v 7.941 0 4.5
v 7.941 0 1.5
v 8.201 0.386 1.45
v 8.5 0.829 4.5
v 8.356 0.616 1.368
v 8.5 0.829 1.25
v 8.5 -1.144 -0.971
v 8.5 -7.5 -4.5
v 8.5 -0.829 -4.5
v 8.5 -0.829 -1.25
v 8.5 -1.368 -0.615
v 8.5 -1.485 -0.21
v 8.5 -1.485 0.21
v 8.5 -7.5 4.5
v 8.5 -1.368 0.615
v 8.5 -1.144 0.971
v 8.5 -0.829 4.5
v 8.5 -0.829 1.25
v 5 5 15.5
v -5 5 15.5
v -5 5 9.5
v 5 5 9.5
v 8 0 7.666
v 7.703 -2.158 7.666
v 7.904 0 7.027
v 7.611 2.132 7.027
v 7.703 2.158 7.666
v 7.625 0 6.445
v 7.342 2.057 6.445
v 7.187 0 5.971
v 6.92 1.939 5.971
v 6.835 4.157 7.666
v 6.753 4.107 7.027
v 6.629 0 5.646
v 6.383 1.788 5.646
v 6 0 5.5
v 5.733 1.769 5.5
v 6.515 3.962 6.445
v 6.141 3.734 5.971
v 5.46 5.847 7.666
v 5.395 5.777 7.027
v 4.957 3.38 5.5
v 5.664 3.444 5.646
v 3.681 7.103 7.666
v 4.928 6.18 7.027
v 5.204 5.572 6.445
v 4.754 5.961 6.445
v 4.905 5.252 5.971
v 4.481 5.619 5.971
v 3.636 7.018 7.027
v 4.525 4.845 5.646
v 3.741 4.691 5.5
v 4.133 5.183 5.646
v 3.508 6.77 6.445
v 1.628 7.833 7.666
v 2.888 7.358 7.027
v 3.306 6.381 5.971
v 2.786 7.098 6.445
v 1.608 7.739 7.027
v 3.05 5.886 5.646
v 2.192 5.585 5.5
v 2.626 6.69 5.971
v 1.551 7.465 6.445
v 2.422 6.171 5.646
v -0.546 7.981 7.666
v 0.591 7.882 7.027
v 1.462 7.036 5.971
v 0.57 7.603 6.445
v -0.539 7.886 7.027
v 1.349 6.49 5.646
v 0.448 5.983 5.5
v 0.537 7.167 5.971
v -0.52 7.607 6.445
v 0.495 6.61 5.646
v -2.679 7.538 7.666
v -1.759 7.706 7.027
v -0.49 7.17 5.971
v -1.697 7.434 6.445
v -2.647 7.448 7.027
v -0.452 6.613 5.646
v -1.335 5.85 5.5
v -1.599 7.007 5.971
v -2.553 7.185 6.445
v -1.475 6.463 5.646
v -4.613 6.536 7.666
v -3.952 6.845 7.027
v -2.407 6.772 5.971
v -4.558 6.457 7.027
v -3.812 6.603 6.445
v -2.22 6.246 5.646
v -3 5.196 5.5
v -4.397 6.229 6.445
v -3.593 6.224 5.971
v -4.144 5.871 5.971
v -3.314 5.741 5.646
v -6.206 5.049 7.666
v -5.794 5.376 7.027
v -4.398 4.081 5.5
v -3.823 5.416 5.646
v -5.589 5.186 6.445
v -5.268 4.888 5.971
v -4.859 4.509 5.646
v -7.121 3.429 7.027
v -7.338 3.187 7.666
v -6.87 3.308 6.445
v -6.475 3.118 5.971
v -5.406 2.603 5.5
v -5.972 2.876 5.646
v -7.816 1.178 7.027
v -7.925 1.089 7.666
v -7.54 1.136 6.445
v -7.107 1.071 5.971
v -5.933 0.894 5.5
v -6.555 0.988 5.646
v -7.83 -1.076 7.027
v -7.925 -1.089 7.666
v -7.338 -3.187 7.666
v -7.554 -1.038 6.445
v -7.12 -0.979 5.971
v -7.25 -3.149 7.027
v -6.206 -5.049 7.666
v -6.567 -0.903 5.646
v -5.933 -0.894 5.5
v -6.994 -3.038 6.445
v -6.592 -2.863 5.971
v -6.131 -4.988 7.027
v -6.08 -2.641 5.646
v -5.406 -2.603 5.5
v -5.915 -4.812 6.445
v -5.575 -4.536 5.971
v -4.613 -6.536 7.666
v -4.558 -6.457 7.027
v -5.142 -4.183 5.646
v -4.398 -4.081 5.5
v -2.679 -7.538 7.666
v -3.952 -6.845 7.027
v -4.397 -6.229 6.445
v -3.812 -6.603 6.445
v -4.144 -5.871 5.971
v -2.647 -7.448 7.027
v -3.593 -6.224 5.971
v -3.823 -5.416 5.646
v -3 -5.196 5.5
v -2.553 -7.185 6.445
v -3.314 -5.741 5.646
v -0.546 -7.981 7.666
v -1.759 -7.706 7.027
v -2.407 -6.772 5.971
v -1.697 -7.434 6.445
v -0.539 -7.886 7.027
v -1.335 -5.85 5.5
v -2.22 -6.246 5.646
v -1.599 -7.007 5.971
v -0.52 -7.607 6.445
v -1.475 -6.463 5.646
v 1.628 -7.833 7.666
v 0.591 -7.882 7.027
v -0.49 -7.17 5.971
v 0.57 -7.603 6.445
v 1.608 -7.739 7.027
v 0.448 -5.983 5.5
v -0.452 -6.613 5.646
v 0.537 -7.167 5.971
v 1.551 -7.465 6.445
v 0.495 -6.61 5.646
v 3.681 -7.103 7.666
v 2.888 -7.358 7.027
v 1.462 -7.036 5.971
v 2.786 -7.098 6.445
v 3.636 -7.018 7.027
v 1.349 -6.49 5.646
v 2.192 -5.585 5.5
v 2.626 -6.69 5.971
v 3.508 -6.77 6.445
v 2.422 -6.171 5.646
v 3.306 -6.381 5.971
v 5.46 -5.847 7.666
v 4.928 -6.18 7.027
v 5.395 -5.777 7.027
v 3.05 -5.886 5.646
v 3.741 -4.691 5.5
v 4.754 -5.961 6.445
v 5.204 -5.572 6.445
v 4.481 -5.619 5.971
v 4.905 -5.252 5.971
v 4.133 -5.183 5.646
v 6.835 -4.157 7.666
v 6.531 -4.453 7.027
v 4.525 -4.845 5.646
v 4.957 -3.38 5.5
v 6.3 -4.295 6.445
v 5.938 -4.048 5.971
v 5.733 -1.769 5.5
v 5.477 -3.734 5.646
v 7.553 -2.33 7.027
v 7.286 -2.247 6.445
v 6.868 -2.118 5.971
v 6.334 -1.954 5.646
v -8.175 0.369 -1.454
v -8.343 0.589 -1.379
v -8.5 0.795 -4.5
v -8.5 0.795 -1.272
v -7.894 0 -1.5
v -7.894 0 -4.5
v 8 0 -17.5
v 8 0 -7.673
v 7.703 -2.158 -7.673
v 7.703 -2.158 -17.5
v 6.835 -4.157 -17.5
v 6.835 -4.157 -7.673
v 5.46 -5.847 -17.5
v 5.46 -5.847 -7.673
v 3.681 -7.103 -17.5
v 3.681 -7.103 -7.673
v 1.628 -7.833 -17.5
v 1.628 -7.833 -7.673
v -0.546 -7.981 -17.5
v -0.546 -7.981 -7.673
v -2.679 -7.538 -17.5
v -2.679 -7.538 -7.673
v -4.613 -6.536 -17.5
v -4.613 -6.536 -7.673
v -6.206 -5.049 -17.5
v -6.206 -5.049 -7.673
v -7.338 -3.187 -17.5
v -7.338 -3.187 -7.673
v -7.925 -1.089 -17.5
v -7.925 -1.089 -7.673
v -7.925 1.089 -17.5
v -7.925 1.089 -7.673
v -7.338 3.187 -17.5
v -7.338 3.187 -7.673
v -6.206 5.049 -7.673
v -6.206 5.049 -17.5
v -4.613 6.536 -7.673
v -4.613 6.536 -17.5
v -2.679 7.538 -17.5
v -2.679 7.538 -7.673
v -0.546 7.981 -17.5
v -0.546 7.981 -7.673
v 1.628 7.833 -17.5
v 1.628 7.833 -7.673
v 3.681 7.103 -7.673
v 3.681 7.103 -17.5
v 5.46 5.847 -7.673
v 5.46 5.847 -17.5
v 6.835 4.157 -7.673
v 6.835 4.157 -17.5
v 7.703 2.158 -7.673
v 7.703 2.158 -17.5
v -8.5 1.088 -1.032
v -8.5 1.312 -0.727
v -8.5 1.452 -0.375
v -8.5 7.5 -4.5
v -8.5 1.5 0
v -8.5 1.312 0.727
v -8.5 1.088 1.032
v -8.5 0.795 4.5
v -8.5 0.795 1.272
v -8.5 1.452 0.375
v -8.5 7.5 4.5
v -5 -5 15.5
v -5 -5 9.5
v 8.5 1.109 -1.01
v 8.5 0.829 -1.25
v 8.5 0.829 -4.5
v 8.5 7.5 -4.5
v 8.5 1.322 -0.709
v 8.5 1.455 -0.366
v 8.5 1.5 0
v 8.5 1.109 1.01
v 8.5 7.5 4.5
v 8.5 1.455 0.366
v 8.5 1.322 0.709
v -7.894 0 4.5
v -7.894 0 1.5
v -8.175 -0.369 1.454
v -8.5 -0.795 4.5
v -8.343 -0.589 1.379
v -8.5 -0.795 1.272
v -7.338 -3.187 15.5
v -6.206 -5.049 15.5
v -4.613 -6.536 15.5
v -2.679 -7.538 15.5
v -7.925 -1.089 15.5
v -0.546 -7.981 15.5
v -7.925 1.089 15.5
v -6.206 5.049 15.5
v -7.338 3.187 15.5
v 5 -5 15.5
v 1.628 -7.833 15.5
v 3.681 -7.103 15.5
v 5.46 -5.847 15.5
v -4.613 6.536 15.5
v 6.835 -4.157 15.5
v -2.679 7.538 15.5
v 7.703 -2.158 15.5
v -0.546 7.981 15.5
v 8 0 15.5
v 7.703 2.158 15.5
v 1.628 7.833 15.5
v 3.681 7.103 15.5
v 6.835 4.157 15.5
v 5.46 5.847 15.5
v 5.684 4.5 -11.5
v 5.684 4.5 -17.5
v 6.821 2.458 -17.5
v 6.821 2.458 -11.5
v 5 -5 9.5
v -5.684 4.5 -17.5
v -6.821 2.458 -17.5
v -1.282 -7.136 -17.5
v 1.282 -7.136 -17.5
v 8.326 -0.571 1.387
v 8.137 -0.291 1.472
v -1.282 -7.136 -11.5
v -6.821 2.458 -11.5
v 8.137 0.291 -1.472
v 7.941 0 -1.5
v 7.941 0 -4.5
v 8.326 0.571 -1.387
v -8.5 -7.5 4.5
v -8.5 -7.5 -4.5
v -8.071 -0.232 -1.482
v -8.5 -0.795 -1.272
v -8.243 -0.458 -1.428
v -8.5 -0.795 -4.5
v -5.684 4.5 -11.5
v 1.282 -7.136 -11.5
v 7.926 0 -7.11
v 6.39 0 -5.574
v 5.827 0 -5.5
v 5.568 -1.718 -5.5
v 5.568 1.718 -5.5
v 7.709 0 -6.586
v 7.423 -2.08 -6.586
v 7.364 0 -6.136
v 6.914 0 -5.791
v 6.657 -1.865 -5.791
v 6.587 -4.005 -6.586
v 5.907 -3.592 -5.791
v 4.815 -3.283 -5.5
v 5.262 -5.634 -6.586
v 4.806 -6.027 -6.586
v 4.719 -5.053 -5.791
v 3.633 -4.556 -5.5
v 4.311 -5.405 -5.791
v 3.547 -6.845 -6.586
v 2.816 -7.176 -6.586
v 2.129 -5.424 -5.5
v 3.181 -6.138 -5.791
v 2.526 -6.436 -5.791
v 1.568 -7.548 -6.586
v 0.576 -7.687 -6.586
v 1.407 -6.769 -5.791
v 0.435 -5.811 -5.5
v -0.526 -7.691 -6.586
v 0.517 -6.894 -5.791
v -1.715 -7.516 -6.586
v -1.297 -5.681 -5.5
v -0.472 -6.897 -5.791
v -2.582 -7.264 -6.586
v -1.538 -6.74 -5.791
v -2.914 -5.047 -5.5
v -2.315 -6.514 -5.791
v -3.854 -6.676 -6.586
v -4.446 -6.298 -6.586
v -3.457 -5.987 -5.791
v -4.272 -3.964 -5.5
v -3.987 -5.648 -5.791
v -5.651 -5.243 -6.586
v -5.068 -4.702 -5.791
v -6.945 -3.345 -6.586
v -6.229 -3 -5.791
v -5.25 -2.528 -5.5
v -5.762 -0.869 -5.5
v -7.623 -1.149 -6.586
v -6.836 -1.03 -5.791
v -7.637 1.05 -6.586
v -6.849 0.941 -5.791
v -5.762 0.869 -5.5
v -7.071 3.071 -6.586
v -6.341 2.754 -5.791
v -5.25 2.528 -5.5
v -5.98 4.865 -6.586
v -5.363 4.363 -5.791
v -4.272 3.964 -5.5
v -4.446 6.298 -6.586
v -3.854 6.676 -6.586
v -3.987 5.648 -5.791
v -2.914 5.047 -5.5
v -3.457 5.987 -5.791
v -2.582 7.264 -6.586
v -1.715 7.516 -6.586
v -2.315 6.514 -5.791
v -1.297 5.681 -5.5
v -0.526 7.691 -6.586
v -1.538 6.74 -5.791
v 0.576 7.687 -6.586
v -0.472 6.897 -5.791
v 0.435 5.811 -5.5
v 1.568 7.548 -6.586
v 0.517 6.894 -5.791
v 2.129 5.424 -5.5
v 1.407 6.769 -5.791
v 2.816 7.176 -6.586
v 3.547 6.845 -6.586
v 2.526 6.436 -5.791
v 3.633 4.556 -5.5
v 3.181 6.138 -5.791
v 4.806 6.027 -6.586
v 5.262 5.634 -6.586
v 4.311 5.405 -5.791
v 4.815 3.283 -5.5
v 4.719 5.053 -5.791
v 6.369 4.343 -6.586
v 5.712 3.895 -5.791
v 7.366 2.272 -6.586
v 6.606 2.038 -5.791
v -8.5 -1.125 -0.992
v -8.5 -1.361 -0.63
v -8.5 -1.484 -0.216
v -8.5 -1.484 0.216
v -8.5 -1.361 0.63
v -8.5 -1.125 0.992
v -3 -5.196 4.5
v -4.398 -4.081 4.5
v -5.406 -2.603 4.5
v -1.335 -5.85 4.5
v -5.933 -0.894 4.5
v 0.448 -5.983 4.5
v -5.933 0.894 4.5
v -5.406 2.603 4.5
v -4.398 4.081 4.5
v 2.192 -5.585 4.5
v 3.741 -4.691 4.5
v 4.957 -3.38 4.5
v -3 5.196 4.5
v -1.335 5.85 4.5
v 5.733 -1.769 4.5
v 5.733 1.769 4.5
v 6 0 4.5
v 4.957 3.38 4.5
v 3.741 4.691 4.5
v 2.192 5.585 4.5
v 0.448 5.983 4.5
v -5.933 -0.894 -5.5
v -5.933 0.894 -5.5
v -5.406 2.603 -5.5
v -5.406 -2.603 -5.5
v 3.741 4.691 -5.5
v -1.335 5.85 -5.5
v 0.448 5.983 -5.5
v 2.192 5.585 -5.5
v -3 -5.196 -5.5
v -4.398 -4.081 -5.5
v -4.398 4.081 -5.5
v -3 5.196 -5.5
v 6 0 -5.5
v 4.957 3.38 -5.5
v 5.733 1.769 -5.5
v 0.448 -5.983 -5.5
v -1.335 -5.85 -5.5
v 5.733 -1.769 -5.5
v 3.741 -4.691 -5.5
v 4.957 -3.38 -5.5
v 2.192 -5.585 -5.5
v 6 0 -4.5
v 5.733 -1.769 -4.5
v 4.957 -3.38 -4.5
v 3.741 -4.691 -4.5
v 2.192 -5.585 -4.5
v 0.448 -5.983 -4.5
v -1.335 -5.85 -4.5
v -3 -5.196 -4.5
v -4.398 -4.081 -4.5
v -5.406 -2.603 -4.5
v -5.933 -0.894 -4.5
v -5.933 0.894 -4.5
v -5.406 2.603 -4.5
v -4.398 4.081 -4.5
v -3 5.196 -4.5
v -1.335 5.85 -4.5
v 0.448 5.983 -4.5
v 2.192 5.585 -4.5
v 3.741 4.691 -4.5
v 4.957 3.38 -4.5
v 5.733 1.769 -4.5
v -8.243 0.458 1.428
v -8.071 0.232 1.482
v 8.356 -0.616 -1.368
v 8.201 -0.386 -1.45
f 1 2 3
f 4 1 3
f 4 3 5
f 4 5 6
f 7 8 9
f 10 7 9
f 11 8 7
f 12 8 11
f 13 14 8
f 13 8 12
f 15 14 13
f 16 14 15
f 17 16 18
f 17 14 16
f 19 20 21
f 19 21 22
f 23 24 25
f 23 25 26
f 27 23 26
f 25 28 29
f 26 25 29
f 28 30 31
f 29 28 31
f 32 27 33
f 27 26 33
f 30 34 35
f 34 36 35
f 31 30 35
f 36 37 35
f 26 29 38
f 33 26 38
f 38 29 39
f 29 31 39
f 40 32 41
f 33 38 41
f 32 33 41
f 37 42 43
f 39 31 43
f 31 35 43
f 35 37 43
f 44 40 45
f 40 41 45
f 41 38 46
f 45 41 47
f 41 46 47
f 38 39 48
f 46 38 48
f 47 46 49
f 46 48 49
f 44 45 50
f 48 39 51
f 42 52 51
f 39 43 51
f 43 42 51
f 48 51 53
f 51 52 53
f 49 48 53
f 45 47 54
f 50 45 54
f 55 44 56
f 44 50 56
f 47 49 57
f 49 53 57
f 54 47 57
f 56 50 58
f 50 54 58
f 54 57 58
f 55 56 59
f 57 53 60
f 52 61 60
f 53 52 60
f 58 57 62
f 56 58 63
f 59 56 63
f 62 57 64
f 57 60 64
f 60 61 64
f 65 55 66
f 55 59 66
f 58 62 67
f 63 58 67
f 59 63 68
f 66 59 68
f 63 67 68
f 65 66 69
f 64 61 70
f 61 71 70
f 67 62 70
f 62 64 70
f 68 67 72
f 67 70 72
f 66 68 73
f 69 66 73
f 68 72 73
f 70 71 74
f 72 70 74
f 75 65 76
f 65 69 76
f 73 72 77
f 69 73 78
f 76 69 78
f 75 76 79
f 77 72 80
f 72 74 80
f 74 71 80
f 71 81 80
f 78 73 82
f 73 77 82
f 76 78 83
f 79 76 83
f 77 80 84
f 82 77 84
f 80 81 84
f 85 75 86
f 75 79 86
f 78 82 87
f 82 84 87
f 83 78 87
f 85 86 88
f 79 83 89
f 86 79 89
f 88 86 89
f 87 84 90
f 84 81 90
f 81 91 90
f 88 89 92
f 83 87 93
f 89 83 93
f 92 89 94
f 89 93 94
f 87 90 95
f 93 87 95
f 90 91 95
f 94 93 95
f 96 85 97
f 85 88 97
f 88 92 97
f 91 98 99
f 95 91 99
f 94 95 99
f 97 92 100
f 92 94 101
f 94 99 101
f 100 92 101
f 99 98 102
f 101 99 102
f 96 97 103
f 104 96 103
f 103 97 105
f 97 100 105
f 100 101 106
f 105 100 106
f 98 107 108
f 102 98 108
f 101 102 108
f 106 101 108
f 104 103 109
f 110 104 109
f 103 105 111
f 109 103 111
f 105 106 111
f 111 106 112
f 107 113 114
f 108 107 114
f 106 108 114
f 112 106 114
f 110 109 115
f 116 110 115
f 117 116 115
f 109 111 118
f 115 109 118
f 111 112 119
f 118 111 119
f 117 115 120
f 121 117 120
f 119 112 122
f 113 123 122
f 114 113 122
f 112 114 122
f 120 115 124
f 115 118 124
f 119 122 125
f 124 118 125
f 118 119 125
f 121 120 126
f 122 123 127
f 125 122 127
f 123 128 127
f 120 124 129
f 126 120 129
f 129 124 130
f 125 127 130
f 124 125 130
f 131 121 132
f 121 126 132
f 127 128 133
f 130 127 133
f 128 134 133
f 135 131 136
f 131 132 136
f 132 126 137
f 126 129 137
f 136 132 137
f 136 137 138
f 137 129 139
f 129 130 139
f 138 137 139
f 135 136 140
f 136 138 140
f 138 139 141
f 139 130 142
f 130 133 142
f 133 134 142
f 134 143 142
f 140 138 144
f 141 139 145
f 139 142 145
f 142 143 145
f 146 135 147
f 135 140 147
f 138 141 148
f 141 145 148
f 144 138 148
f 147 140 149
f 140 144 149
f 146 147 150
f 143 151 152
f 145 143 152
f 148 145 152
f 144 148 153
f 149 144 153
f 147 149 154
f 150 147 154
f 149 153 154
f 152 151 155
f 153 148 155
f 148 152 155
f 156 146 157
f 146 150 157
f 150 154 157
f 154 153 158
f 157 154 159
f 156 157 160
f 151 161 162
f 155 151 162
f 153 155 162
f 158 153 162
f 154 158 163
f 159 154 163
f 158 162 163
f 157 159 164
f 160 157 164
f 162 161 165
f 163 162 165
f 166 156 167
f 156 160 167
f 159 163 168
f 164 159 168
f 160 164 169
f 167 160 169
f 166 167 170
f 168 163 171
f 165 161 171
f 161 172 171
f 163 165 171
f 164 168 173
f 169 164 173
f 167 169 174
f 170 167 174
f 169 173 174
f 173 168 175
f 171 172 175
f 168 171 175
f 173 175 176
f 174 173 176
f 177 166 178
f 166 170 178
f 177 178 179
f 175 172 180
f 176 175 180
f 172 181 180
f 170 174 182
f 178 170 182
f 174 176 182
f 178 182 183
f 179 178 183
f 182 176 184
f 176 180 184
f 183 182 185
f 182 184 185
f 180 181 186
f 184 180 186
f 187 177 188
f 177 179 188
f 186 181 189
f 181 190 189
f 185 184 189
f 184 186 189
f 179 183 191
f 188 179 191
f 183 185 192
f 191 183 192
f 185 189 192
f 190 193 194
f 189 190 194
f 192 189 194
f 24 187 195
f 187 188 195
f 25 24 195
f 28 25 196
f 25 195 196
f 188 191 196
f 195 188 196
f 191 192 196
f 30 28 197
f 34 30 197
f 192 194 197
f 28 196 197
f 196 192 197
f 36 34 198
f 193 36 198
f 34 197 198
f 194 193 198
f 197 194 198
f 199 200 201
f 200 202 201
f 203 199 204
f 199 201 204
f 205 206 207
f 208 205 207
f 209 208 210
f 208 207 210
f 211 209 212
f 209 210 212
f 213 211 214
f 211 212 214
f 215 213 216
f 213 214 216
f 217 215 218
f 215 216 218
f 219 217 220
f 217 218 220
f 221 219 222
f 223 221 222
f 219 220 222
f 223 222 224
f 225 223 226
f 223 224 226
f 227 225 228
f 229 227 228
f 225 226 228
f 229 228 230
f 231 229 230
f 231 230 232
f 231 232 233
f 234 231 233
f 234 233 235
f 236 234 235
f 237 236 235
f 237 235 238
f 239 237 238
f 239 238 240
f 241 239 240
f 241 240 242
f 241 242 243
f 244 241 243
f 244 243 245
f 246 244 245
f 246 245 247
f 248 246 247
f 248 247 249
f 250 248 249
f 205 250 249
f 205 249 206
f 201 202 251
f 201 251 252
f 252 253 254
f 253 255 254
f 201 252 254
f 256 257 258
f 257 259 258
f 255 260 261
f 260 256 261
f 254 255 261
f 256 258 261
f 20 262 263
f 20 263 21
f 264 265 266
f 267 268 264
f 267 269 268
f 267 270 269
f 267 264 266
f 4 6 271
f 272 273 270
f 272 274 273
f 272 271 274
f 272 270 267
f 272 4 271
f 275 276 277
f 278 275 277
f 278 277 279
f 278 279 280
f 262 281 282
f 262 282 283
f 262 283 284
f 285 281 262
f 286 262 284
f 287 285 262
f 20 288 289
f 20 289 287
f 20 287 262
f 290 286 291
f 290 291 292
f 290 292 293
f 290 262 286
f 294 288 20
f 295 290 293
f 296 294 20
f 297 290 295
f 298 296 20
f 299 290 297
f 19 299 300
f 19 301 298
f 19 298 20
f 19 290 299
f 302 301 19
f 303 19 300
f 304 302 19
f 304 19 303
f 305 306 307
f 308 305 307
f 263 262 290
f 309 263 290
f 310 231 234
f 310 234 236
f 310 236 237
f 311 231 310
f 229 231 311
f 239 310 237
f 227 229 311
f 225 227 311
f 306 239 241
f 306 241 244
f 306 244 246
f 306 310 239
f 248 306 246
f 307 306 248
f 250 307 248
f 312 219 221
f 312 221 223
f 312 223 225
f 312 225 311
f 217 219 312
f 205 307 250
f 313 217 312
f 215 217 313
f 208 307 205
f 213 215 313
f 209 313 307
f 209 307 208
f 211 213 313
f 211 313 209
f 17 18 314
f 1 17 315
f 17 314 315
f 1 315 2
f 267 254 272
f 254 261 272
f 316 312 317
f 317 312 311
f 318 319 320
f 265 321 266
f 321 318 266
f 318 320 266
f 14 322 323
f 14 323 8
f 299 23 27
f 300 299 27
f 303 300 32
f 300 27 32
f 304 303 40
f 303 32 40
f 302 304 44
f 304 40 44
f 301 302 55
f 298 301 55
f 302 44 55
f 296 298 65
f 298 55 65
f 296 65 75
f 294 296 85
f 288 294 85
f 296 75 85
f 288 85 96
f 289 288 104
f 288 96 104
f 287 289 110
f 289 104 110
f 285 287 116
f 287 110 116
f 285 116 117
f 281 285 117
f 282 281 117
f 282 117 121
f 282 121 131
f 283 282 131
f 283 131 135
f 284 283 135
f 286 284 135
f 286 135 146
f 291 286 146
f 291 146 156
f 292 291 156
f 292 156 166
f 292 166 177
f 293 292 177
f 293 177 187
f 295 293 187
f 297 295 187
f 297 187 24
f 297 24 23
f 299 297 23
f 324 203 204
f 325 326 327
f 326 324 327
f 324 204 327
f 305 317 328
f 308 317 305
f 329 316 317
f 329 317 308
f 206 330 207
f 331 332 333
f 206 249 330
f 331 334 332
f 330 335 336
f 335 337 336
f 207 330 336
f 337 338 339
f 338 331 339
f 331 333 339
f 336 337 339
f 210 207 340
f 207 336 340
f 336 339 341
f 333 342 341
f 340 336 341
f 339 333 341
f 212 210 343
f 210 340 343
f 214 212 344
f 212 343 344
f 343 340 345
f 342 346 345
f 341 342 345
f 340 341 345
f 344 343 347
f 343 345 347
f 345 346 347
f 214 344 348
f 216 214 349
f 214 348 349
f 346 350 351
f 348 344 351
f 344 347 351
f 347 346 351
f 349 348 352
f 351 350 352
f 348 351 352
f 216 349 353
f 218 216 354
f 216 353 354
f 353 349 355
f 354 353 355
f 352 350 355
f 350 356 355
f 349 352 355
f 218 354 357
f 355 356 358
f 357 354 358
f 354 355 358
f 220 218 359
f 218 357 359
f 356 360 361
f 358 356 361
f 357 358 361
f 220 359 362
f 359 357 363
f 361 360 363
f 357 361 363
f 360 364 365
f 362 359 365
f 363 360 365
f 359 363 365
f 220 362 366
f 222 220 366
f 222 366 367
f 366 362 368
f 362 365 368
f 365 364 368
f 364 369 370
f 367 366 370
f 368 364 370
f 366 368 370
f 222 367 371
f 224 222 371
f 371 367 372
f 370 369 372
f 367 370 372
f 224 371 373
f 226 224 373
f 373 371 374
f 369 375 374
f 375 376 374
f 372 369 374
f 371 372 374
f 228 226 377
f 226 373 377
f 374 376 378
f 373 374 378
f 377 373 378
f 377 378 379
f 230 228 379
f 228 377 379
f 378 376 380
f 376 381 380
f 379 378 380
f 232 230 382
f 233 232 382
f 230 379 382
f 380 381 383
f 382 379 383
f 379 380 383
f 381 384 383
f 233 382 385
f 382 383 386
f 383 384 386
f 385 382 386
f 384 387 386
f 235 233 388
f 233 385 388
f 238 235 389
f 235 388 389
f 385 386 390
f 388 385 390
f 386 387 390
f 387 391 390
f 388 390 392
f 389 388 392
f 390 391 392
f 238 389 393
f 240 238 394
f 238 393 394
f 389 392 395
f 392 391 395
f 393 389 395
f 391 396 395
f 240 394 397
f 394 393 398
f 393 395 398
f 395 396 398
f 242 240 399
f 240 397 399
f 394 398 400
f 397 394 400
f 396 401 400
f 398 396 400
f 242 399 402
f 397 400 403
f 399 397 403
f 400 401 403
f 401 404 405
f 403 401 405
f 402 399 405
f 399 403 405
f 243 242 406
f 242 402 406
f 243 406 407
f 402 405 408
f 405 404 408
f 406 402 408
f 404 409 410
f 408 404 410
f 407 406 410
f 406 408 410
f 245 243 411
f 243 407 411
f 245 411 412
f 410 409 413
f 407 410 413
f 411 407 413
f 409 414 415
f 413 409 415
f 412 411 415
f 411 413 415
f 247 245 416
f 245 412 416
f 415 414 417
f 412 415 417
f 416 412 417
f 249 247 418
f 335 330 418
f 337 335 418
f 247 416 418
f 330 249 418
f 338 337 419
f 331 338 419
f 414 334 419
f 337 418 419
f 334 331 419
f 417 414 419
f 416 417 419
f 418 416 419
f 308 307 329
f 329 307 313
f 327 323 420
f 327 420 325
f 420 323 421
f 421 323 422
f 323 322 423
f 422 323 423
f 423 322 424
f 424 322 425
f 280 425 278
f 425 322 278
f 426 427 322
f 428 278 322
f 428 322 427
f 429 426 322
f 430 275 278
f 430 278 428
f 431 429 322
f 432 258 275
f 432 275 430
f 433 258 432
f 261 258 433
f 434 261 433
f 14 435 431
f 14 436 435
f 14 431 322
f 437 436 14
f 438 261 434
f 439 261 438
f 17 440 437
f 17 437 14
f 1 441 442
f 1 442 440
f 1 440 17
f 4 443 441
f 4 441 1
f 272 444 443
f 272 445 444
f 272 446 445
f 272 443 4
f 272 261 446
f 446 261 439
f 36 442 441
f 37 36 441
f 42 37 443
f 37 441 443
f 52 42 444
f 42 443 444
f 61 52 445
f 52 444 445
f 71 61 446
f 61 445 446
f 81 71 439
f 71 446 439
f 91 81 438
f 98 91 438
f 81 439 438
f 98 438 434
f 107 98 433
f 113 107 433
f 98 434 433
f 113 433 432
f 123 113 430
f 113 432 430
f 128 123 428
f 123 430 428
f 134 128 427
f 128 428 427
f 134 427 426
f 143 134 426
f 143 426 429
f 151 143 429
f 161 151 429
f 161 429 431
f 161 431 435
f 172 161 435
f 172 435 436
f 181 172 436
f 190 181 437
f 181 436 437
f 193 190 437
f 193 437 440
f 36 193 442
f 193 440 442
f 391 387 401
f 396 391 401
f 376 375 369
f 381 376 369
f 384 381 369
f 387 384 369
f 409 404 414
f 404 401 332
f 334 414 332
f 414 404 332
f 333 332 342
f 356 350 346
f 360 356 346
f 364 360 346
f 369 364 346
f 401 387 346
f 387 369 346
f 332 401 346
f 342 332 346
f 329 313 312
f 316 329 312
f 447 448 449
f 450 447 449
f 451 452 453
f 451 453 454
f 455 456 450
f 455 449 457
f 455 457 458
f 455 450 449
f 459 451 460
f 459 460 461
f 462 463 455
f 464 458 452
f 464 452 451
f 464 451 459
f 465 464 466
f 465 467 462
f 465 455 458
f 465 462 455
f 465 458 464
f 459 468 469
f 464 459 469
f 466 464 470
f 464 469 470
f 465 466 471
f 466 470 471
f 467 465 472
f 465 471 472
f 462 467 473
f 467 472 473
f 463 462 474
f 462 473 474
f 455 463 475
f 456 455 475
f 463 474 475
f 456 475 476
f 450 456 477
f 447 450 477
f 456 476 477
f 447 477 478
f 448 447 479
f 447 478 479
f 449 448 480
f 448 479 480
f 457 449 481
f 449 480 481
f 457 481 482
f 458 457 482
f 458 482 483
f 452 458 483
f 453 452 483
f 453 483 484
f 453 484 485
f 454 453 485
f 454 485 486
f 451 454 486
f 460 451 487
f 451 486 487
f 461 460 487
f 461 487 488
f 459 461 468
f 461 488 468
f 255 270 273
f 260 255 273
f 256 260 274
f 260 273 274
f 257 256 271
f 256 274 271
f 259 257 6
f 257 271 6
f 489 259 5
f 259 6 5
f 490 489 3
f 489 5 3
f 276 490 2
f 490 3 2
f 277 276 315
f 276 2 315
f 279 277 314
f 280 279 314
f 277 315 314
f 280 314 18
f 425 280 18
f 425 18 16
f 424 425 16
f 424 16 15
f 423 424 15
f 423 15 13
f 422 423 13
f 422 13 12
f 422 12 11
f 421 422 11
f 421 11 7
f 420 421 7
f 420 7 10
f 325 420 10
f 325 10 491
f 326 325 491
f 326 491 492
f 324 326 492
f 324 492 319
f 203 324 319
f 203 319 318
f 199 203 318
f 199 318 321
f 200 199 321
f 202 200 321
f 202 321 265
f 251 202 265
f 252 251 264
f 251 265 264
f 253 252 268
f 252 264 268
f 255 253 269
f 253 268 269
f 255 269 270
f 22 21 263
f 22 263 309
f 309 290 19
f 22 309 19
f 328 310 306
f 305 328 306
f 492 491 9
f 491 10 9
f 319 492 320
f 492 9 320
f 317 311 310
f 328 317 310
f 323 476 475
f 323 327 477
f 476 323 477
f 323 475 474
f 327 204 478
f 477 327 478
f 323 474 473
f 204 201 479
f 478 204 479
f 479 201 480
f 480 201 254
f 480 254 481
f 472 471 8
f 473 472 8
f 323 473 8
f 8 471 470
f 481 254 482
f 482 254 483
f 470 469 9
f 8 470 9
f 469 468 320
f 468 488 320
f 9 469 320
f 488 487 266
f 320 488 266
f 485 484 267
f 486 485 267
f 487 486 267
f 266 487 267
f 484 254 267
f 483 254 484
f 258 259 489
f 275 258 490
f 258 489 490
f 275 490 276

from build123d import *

# Parameters (mm, degrees)
F0_W      = 17
F0_H      = 15
F1_DEPTH  = 4.5
F2_R      = 6
F3_DEPTH  = 1
F4_R      = 6
F5_DEPTH  = 1
F6_R      = 1.5
F7_DEPTH  = 17.001
F9_DEPTH  = 10.001
F10_R     = 8
F11_DEPTH = 10
F12_R     = 8
F12_R_2   = 6
F13_DEPTH = 12
F16_DEPTH = 6
F17_W     = 10
F17_H     = 10
F18_DEPTH = 6


# Not quite as in the source:
# - a fillet or chamfer that OpenCascade refuses, or shapes differently, is made with other operations: its cross-section is extruded or revolved along the edge and cut away or added


with BuildPart() as f1:
    # F0 (on Top) → F1 (new body, symmetric)
    with BuildSketch(Plane.XY):
        Rectangle(F0_W, F0_H)
    extrude(amount=F1_DEPTH, both=True)

    # F2 (on face) → F3 (join)
    with BuildSketch(Plane.XY.offset(4.5)):
        Circle(F2_R)
    extrude(amount=F3_DEPTH)

    # F4 (on face) → F5 (join)
    with BuildSketch(Plane(origin=(0, 0, -4.5), x_dir=(1, 0, 0), z_dir=(0, 0, -1))):
        Circle(F4_R)
    extrude(amount=F5_DEPTH)

    # F6 (on face) → F7 (cut, through all)
    with BuildSketch(Plane.YZ.offset(8.5)):
        Circle(F6_R)
    extrude(amount=-F7_DEPTH, mode=Mode.SUBTRACT)

    # F8 (on face) → F9 (cut, through all)
    with BuildSketch(Plane(origin=(0, 0, -4.5), x_dir=(1, 0, 0), z_dir=(0, 0, -1))):
        Polygon((8.5, 0.8288529099), (7.9405334204, 0), (8.5, -0.8288529099), align=None)
        Polygon((-8.5, -0.7952927344), (-7.8937744095, 0), (-8.5, 0.7952927344), align=None)
    extrude(amount=-F9_DEPTH, mode=Mode.SUBTRACT)

    # F10 (on face) → F11 (join)
    with BuildSketch(Plane.XY.offset(5.5)):
        Circle(F10_R)
    extrude(amount=F11_DEPTH)

    # F14: fillet of radius 2.1727922061 on 1 edges, made by hand

    # F14_s1 → F14_t2 (revolve, cut)
    with BuildSketch(Plane.XZ):
        with BuildLine():
            ThreePointArc((8, 7.6659106225), (7.4235266107, 6.1918712044), (6, 5.5))
            Line((6, 5.5), (8, 5.5))
            Line((8, 5.5), (8, 7.6659106225))
        make_face()
    revolve(axis=Axis((0, 0, 5.5), (0, 0, 1)), mode=Mode.SUBTRACT)

    # F17 (on face) → F18 (cut)
    with BuildSketch(Plane.XY.offset(15.5)):
        Rectangle(F17_W, F17_H)
    extrude(amount=-F18_DEPTH, mode=Mode.SUBTRACT)


with BuildPart() as f13:
    # F12 (on face) → F13 (new body)
    with BuildSketch(Plane(origin=(0, 0, -5.5), x_dir=(1, 0, 0), z_dir=(0, 0, -1))):
        Circle(F12_R)
        Circle(F12_R_2, mode=Mode.SUBTRACT)
        Circle(F12_R_2)
    extrude(amount=F13_DEPTH)

    # F14#2: fillet of radius 2.1727922061 on 1 edges, made by hand

    # F14_2_s1 → F14_2_t2 (revolve, cut)
    with BuildSketch(Plane.XZ):
        with BuildLine():
            ThreePointArc((8, -7.6727922061), (7.3636038969, -6.1363961031), (5.8272077939, -5.5))
            Line((5.8272077939, -5.5), (8, -5.5))
            Line((8, -5.5), (8, -7.6727922061))
        make_face()
    revolve(axis=Axis((0, 0, -5.5), (0, 0, -1)), mode=Mode.SUBTRACT)

    # F15 (on face) → F16 (cut)
    with BuildSketch(Plane(origin=(0, 0, -17.5), x_dir=(1, 0, 0), z_dir=(0, 0, -1))):
        Polygon((1.2821056222, 7.1357343822), (-1.2821056222, 7.1357343822), (-6.8207800608, -2.4575311519), (-5.6844085005, -4.5), (5.6844085005, -4.5), (6.8207800608, -2.4575311519), align=None)
    extrude(amount=-F16_DEPTH, mode=Mode.SUBTRACT)


solid = Compound([f1.part, f13.part])
